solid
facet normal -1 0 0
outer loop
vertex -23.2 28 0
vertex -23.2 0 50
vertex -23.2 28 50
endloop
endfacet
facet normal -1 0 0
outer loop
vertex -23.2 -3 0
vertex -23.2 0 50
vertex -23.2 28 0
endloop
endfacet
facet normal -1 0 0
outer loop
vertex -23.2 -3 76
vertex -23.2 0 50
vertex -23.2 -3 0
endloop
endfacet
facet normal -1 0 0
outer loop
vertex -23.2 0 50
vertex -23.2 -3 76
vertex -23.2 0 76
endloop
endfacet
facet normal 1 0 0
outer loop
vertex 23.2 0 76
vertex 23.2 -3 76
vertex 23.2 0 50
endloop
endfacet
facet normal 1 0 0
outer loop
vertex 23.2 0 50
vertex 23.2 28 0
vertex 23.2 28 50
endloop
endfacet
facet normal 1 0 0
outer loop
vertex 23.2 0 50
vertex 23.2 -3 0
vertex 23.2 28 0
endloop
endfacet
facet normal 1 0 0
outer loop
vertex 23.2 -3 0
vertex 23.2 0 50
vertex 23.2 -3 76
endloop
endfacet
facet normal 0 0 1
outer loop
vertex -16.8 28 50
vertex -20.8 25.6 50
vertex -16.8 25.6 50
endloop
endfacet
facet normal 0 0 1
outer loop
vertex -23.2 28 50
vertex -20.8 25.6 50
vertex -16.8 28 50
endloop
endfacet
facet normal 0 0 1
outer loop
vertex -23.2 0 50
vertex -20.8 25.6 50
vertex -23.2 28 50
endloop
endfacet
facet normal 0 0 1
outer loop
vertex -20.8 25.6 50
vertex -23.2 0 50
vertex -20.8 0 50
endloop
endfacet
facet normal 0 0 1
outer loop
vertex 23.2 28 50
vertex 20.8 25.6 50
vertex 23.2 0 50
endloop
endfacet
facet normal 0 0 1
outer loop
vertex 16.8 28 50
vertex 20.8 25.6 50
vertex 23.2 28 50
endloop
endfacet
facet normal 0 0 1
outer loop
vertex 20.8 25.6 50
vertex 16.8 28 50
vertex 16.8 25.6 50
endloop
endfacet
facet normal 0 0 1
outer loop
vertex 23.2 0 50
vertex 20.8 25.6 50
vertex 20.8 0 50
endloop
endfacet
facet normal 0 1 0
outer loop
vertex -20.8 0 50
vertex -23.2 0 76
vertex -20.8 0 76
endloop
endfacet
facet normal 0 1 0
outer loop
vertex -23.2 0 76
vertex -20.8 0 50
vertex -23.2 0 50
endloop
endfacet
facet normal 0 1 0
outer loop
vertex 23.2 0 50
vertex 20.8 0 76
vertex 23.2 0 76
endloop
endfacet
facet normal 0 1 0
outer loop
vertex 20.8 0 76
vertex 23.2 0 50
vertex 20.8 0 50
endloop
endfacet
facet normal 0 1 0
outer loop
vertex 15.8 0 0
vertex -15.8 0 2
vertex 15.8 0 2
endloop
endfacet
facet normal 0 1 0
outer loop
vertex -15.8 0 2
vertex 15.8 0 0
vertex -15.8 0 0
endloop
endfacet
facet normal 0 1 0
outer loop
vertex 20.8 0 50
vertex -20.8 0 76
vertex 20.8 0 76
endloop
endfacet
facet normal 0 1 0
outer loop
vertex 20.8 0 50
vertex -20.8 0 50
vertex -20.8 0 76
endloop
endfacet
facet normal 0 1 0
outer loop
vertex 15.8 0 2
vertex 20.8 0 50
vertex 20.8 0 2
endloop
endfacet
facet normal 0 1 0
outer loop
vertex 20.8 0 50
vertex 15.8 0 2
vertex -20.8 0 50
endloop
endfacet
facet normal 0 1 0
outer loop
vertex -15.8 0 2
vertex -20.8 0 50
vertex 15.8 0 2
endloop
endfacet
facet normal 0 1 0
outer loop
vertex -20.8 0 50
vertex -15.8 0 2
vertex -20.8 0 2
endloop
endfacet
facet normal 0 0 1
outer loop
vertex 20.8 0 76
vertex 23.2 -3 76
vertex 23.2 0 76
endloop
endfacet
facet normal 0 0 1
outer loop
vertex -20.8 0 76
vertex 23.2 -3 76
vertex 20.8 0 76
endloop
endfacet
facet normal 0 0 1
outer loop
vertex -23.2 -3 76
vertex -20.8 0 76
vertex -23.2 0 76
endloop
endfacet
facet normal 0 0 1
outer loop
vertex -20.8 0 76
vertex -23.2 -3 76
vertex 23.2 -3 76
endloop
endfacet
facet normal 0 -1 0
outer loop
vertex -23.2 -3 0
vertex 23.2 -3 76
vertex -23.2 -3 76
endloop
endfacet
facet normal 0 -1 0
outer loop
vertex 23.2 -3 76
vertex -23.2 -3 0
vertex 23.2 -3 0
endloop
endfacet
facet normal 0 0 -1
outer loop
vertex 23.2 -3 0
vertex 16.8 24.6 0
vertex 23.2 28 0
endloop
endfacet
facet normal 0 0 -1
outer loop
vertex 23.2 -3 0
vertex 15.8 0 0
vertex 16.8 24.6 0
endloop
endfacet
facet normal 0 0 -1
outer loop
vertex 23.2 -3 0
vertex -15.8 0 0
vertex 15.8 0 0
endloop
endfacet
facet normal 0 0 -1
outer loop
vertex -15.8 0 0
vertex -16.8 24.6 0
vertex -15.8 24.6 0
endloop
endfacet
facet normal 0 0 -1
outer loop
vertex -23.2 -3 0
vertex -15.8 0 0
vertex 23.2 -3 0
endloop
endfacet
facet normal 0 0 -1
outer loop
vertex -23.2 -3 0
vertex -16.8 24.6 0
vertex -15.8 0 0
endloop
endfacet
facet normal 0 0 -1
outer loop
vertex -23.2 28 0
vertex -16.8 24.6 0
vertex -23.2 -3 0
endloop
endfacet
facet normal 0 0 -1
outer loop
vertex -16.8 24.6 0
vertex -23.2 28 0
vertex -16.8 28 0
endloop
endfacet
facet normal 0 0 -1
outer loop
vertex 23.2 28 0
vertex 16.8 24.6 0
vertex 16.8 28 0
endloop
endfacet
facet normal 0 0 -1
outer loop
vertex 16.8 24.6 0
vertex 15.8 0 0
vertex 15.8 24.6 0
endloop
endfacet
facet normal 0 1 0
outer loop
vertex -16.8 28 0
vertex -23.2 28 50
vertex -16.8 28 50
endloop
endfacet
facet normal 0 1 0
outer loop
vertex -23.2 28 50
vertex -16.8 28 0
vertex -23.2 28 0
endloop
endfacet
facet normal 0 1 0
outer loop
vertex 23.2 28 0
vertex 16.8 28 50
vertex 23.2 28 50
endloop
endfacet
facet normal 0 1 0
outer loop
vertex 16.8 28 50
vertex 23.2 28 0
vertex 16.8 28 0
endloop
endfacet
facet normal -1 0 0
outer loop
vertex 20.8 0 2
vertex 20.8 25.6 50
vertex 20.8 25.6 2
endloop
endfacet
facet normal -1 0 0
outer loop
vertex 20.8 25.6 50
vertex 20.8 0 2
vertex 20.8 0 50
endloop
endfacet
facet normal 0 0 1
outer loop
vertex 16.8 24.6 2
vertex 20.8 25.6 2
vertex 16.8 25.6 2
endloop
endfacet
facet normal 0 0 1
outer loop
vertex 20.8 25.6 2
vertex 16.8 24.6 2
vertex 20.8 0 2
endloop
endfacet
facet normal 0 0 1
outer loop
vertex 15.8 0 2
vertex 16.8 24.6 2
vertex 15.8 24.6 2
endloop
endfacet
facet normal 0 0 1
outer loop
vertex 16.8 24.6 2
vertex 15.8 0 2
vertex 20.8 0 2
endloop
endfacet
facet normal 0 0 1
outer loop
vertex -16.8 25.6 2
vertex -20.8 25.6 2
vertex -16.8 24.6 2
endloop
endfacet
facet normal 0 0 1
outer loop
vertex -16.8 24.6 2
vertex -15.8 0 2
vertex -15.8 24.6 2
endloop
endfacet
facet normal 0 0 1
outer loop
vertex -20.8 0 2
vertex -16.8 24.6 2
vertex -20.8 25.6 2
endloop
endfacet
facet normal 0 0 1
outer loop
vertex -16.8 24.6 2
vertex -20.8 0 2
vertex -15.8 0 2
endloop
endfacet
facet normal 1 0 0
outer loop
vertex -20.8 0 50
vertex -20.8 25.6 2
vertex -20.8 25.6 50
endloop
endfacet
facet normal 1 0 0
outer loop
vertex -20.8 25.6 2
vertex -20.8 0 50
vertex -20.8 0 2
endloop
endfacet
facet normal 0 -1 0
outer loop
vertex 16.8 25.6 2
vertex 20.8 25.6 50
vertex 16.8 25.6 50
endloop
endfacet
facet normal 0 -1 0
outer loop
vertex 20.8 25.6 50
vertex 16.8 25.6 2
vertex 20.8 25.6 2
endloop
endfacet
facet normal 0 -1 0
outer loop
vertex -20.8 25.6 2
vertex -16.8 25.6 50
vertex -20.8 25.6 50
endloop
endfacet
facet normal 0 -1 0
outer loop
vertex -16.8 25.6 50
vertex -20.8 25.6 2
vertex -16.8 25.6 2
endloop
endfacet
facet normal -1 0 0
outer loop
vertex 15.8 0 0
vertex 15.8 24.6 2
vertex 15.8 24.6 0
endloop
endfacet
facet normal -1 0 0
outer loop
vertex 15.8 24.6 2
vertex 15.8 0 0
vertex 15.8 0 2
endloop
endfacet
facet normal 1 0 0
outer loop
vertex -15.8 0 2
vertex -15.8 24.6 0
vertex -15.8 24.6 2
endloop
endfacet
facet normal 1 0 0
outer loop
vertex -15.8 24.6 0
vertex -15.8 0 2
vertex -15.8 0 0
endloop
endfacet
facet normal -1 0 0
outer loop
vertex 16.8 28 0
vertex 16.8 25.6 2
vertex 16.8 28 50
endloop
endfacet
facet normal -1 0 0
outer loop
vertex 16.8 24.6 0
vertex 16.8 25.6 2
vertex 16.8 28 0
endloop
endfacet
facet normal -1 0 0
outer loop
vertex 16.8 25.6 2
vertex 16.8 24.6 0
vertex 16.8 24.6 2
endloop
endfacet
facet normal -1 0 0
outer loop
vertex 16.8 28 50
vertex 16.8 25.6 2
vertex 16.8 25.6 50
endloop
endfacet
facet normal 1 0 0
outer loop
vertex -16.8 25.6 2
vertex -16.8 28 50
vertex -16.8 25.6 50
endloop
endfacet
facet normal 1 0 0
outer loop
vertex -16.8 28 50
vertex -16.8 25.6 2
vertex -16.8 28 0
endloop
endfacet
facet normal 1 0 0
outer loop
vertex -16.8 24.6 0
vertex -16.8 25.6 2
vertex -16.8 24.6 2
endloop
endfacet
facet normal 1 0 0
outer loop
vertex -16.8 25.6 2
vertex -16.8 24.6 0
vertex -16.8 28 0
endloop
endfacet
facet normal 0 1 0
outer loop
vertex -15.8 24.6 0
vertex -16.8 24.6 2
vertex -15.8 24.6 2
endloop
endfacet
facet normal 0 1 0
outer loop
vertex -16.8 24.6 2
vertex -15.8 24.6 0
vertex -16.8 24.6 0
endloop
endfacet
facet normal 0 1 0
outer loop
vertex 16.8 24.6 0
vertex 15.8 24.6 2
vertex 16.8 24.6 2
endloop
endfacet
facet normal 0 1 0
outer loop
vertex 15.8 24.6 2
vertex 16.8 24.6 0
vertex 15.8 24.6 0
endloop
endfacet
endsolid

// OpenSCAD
/* =====================================================
   Device wall mount (slide-in channel)
   =====================================================
   A slide-in channel for a small boxy radio gadget, stuck to
   the wall with a Command strip. The device stands on end and
   drops in from the top. It rests on two small corner ledges
   and is held against the plate by lips along the front edges.

   Devices (measured, width x length x thickness):
     airspy-r2     41 x 54 x 25. SMA antenna on one end, USB on
                   the other
     sms-modem     46 x 90 x 15. USB-A plug out the bottom
                   middle, antenna out the top centre

   Each device's connectors are on its two short ends. Both
   ends of the channel are open, and the ledges only cover the
   outer 5 mm of the bottom end, so plugs and antennas centred
   on those ends clear everything. Push the device down while
   you plug in its bottom end, since nothing stops it lifting
   out the top.

   The back plate runs above the channel when the device is
   short, so there's always room for a medium Command strip
   (19 x 70) standing upright. Most of the front face is open
   so LEDs show.

   Print it standing up, ledges on the bed. Every wall is
   vertical, so it needs no supports.

   Coordinates: X across (centred), Y out from the wall (plate
   front face at Y = 0), Z up from the bottom of the channel.
   ===================================================== */

/* ── Device (measured; presets in the .json) ───────────── */
dev_w = 41;   // across, flat against the wall
dev_l = 54;   // up the wall, connector end to connector end
dev_t = 25;   // out from the wall

/* ── Mount ──────────────────────────────────────────── */
clear   = 0.3;   // per side around the case
wall    = 2.4;
plate_t = 3;     // back plate / Command strip plate
strip_l = 70;    // medium Command strip, standing upright
lip     = 4;     // front lips reach this far over the face
ledge   = 5;     // corner ledges reach this far under the case
ledge_t = 2;
chan_drop = 6;   // channel walls end this far under the case top

/* ── Derived ────────────────────────────────────────── */
pw = dev_w + 2 * clear;            // pocket
pd = dev_t + 2 * clear;
ow = pw + 2 * wall;               // outside width
chan_h = ledge_t + dev_l - chan_drop;
plate_h = max(chan_h, strip_l + 6);

eps = 0.01;

// One solid with the pocket cut out. Unioning the plate, walls
// and ledges as separate blocks leaves duplicate vertices where
// their faces line up.
module mount() {
    difference() {
        // side view: plate up the back, channel at the bottom
        translate([-ow / 2, 0, 0]) rotate([90, 0, 90]) linear_extrude(ow)
            polygon(plate_h > chan_h
                ? [[-plate_t, 0], [pd + wall, 0], [pd + wall, chan_h],
                   [0, chan_h], [0, plate_h], [-plate_t, plate_h]]
                : [[-plate_t, 0], [pd + wall, 0], [pd + wall, chan_h],
                   [-plate_t, chan_h]]);
        // pocket, above the ledges
        translate([-pw / 2, 0, ledge_t]) cube([pw, pd, plate_h]);
        // open bottom between the ledges
        translate([-pw / 2 + ledge, 0, -1]) cube([pw - 2 * ledge, pd, ledge_t + 2]);
        // open front between the lips
        translate([-pw / 2 + lip, pd - 1, -1]) cube([pw - 2 * lip, wall + 2, chan_h + 2]);
    }
}

// the device, for checking the fit in preview only
module dev_mock() {
    color("dimgray")
        translate([-dev_w / 2, clear, ledge_t]) cube([dev_w, dev_t, dev_l]);
}

mount();
%dev_mock();
